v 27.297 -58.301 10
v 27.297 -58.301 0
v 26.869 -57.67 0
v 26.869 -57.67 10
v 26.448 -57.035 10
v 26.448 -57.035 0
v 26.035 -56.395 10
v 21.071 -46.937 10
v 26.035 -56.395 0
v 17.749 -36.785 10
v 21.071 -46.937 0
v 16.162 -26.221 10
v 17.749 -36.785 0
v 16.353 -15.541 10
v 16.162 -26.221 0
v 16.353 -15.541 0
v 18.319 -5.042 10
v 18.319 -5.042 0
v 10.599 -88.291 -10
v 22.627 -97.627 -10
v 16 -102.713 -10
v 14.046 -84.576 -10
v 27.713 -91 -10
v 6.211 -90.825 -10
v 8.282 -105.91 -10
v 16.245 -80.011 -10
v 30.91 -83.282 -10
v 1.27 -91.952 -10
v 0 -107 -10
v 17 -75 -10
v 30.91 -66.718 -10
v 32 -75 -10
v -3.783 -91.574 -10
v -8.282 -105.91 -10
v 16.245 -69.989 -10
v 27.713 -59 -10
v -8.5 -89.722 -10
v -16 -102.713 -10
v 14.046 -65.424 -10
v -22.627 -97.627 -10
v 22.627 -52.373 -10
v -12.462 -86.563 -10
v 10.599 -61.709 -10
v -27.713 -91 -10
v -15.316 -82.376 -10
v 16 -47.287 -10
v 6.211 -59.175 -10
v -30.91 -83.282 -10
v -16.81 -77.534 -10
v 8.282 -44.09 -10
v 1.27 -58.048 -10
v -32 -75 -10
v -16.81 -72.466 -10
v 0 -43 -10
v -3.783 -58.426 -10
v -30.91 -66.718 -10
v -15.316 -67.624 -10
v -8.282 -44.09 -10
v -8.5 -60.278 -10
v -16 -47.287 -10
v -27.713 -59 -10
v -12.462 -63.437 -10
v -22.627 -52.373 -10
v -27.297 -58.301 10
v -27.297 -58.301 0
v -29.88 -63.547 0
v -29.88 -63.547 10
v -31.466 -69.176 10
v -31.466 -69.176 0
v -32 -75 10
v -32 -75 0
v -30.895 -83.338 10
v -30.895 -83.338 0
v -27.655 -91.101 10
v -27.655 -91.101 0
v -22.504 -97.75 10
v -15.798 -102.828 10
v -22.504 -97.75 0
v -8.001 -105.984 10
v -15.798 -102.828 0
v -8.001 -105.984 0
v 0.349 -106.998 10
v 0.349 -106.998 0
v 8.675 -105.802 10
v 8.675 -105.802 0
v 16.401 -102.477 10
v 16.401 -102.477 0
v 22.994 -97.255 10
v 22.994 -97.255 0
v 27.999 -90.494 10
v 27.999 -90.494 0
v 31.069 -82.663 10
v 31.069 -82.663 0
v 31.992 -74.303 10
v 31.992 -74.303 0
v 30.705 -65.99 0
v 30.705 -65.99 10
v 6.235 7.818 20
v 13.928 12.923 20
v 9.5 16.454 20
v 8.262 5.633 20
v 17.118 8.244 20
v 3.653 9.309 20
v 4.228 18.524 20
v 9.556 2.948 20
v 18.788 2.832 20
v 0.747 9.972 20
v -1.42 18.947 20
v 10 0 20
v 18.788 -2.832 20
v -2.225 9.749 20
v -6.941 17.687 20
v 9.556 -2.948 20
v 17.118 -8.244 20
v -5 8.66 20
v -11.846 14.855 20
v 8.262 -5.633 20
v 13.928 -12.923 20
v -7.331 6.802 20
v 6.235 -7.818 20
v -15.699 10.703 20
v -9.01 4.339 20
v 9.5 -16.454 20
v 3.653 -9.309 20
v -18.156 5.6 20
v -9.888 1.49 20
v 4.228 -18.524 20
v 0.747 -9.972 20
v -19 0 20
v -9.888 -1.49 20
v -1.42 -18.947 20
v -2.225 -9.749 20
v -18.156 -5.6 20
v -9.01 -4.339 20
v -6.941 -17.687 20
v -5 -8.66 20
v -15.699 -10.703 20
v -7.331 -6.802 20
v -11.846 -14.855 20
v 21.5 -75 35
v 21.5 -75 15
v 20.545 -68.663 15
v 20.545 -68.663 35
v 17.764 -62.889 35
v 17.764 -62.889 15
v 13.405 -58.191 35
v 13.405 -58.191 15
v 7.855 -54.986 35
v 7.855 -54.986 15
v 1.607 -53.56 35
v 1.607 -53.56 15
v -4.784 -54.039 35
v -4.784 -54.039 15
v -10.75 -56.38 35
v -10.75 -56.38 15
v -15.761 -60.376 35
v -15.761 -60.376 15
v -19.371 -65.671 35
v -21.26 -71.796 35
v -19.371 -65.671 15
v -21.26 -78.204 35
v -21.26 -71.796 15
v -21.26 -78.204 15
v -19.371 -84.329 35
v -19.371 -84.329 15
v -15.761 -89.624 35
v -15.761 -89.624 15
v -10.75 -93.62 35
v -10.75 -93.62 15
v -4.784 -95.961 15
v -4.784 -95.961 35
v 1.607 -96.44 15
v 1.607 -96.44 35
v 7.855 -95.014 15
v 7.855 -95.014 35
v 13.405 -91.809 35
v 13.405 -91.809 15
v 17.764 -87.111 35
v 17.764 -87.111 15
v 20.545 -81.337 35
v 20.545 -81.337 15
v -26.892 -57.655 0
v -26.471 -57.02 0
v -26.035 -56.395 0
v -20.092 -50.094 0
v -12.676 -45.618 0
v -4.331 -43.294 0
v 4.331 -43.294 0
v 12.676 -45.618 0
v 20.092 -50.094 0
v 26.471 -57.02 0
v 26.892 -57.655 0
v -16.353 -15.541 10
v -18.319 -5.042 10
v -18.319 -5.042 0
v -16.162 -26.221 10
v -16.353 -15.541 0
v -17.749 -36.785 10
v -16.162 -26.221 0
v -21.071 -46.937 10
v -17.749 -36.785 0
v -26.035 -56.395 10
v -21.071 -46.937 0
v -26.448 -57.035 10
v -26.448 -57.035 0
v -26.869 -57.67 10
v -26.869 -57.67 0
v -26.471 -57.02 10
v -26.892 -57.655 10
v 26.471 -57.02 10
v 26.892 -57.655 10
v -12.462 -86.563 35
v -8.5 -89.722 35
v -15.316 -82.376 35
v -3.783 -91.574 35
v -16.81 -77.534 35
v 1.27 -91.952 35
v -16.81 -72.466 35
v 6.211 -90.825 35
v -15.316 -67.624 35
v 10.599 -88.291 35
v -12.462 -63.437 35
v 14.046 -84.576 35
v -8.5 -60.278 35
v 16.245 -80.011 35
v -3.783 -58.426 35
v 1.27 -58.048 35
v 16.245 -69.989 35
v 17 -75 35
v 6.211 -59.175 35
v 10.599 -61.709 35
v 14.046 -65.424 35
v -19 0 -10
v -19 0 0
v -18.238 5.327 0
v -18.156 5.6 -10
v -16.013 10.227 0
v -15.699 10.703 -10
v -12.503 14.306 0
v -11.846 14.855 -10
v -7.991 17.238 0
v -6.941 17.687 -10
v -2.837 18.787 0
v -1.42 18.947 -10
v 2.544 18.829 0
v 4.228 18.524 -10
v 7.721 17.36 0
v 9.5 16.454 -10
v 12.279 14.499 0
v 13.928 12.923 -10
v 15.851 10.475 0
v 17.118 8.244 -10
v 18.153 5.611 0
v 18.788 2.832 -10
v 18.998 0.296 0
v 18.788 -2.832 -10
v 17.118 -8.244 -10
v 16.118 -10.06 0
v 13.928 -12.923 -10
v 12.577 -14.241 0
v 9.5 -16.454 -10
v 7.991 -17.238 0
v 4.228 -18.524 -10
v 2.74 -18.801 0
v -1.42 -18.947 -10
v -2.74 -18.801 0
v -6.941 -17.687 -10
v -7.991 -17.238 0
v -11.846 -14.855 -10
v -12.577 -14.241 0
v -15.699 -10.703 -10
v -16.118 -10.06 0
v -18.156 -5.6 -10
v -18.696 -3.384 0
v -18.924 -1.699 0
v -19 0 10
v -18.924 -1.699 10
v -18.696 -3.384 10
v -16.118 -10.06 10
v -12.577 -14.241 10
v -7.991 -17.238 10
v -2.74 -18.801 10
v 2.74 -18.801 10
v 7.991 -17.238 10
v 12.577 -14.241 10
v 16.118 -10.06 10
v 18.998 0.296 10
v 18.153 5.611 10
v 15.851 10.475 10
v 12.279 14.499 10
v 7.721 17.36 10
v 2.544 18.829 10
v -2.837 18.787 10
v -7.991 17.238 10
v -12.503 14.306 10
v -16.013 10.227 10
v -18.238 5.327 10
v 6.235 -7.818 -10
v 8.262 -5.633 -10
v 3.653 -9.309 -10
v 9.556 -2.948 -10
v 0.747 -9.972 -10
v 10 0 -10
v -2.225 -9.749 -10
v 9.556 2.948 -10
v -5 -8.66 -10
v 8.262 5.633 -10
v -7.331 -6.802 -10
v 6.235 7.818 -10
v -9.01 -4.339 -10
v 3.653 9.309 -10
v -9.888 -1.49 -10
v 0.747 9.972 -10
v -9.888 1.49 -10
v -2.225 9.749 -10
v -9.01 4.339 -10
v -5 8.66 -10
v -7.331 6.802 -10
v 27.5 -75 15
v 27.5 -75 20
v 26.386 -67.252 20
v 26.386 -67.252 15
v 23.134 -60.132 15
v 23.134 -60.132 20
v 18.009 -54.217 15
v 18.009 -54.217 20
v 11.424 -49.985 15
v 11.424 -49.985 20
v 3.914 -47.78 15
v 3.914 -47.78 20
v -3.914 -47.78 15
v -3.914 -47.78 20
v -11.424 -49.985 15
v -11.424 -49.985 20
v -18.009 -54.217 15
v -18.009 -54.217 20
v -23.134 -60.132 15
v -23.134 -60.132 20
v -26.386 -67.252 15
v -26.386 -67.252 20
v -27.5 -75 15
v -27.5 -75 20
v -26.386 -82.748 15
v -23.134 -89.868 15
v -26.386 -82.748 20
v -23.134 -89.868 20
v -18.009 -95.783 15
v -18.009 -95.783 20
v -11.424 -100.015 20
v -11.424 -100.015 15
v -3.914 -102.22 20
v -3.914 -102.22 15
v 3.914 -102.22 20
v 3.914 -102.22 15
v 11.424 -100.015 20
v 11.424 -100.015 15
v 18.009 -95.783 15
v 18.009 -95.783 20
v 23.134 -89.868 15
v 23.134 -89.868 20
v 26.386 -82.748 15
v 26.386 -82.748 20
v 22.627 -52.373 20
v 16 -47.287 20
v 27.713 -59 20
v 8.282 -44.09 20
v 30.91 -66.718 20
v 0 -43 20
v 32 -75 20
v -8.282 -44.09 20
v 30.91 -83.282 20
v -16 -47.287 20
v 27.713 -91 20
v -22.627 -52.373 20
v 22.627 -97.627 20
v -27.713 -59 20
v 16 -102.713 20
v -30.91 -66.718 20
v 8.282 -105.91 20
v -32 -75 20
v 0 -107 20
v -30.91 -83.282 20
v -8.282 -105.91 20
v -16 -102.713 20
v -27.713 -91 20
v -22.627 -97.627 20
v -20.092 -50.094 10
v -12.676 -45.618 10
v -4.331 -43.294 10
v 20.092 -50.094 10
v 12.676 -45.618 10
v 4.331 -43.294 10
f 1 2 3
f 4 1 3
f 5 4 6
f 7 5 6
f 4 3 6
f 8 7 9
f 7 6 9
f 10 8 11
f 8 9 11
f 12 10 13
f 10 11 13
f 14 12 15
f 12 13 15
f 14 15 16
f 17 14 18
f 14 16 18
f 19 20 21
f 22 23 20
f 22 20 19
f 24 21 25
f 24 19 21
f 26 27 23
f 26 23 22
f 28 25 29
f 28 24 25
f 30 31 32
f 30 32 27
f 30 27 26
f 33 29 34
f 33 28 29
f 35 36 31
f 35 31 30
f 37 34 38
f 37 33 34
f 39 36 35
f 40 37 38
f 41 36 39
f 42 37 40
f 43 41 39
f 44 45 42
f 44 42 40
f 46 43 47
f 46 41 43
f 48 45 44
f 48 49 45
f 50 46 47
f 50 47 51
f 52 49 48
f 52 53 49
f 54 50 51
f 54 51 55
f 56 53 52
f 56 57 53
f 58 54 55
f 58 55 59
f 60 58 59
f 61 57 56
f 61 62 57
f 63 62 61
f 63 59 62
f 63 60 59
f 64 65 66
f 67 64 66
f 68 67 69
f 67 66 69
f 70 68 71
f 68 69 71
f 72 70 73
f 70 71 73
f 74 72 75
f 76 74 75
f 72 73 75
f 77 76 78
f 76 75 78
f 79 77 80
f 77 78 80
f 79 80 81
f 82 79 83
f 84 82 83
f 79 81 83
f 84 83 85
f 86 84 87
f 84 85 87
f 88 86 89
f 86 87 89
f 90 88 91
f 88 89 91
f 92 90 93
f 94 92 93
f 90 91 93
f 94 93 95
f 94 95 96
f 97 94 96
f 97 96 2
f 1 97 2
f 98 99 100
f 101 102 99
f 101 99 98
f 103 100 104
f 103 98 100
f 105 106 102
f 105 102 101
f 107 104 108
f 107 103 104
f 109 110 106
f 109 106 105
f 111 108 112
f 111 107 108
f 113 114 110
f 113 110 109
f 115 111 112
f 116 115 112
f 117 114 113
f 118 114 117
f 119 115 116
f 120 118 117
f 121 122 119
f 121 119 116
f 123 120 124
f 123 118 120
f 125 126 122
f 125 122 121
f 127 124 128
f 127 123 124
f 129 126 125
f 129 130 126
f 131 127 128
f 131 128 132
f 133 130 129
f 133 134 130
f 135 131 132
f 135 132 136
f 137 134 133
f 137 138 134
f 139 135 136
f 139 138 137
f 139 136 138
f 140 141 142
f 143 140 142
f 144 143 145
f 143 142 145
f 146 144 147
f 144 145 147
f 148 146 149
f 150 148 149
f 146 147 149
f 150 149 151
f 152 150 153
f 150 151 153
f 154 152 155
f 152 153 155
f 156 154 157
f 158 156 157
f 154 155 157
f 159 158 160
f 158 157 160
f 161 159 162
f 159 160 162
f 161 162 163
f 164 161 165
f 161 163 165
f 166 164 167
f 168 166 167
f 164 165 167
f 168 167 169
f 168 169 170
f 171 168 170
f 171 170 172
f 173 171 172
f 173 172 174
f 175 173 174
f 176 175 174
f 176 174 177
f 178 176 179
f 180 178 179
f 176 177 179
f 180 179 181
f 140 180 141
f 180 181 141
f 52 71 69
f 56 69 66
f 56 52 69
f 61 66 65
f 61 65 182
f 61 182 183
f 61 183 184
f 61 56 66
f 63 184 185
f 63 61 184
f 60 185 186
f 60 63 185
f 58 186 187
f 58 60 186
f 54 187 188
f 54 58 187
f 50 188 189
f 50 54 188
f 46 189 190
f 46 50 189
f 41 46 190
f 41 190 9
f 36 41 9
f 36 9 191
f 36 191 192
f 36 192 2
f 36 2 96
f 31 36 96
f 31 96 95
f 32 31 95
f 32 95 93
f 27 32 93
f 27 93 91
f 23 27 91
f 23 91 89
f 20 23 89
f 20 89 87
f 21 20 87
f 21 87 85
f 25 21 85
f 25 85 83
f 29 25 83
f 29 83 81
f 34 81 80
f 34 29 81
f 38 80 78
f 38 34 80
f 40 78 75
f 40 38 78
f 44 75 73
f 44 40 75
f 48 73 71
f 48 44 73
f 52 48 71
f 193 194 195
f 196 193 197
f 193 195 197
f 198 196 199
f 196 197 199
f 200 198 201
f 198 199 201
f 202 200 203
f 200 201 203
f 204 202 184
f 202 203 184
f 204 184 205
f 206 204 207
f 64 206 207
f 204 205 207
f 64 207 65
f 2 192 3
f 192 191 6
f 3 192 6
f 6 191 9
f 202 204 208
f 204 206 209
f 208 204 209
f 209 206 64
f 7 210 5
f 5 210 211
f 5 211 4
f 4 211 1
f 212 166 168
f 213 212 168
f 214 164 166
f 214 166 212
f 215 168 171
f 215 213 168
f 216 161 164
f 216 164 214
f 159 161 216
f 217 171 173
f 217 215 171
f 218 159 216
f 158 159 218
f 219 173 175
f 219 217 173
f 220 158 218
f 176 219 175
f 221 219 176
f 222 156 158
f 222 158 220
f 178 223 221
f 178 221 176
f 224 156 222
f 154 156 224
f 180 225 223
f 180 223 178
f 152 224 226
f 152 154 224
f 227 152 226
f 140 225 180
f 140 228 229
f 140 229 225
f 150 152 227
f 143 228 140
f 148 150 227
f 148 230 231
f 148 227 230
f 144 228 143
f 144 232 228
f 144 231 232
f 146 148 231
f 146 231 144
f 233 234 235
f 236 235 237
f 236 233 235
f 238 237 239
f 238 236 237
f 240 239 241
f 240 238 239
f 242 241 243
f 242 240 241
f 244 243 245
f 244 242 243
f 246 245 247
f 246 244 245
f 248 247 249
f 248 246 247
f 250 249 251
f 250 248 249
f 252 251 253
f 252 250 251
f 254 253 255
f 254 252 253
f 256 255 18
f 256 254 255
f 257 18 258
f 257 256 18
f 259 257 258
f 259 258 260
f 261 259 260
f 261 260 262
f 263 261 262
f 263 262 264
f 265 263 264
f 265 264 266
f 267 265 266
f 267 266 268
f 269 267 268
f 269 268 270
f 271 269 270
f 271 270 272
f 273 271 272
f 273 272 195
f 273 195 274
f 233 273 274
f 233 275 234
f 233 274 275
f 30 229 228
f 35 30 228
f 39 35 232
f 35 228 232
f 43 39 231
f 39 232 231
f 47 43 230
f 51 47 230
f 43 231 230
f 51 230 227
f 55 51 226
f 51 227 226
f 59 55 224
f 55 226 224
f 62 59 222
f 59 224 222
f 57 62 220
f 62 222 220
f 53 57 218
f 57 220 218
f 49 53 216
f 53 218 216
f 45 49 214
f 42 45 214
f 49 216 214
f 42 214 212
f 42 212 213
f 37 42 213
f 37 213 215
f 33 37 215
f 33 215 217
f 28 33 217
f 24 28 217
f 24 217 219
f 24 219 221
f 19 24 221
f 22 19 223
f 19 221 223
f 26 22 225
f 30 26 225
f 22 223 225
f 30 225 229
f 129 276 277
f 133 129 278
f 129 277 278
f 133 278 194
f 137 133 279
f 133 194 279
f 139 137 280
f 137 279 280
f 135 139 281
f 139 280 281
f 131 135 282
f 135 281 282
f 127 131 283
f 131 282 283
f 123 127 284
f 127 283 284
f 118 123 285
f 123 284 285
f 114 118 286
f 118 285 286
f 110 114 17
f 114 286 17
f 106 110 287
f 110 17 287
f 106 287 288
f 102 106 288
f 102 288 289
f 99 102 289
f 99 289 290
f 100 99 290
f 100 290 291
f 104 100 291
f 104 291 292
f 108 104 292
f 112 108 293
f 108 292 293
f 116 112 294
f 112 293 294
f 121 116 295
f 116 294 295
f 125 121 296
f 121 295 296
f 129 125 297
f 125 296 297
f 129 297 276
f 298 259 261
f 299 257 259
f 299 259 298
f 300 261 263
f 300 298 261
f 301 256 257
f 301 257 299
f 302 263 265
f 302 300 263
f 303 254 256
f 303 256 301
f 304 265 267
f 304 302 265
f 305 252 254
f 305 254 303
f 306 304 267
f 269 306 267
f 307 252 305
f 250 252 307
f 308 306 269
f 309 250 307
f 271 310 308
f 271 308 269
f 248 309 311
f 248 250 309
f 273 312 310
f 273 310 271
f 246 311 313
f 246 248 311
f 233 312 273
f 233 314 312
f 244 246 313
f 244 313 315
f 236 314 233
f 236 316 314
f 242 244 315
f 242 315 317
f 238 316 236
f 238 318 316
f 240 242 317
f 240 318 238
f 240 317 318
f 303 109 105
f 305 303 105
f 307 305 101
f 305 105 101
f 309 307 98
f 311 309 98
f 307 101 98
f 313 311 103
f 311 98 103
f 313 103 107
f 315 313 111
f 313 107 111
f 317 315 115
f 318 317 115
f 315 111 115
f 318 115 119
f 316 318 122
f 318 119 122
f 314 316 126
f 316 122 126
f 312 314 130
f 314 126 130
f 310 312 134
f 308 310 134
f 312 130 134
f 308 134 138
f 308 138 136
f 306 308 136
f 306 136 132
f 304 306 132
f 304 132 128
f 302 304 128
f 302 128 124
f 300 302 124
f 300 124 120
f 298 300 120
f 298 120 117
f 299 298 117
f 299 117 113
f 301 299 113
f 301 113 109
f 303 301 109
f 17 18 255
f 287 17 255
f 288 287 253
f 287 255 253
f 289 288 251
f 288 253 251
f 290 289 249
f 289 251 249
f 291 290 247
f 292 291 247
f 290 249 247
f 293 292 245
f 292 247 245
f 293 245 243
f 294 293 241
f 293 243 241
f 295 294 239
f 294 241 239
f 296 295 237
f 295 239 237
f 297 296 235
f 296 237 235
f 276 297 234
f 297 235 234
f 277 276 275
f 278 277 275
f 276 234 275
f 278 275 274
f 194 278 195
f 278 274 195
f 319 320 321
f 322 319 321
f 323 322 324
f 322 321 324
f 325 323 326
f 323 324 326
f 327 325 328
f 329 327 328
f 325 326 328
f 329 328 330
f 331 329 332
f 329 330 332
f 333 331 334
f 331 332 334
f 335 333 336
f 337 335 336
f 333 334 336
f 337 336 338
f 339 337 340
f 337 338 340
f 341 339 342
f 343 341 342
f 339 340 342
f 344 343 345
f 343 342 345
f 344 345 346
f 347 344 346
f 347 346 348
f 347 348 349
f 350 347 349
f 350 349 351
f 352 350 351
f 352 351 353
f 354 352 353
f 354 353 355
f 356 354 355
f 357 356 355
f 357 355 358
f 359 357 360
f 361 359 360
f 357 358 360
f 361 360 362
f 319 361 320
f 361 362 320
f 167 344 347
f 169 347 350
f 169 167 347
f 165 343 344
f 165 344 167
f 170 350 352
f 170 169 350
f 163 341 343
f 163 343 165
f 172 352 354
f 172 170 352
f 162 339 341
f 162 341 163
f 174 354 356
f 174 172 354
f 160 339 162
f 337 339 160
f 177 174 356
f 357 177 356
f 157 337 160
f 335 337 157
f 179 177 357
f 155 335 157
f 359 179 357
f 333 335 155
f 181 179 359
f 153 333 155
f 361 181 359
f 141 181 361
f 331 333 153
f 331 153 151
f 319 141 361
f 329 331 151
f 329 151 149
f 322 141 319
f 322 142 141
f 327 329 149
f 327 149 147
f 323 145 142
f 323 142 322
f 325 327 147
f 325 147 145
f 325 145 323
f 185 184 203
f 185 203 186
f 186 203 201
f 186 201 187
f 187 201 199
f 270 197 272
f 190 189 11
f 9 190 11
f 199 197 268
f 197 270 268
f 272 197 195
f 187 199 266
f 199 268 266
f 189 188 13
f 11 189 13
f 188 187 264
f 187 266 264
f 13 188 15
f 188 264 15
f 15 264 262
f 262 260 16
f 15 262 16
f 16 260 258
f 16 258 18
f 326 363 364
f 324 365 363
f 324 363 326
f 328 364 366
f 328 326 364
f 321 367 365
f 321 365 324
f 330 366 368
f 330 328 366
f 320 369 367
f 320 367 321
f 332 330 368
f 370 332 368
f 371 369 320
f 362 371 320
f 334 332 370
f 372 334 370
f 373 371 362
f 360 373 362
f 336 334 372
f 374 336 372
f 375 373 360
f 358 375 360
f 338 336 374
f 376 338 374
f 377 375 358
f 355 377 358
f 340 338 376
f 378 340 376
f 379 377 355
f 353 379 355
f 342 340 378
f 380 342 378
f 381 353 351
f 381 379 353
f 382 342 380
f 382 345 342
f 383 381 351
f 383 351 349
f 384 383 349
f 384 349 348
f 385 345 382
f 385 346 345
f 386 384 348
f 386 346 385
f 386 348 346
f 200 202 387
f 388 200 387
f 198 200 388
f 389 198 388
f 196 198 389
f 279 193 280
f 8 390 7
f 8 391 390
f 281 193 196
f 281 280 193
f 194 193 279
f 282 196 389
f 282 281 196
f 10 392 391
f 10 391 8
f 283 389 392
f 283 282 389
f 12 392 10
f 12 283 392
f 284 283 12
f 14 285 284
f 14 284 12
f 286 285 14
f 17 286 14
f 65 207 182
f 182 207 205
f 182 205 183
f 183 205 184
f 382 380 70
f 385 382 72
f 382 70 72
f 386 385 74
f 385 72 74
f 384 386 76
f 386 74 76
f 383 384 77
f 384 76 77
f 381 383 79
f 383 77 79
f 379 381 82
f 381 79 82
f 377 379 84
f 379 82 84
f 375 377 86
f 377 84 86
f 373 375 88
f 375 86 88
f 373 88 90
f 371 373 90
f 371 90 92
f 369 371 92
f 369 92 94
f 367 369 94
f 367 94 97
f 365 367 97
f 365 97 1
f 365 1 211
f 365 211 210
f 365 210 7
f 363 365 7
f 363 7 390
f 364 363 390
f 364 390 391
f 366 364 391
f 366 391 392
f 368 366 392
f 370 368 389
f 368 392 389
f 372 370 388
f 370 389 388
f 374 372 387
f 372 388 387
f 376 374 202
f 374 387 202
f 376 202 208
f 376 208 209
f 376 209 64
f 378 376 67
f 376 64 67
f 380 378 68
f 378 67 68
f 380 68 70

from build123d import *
from build123d.topology import SkipClean

# Parameters (mm, degrees)
BOSS_EXTRU_7_DEPTH       = 10
BOSS_EXTRU_13_START      = 10
ESQUISSE14_R             = 19
ESQUISSE14_R_2           = 32
BOSS_EXTRU_13_DEPTH      = 10
ESQUISSE15_R             = 19
BOSS_EXTRU_14_DEPTH      = 10
ESQUISSE16_R             = 32
BOSS_EXTRU_16_DEPTH      = 10
ESQUISSE21_R             = 27.5
ENL_V_MAT_EXTRU_10_DEPTH = 5
ESQUISSE25_R             = 21.5
BOSS_EXTRU_18_DEPTH      = 20
ESQUISSE26_R             = 17
ENL_V_MAT_EXTRU_11_DEPTH = 45
ESQUISSE27_R             = 10
ENL_V_MAT_EXTRU_12_DEPTH = 45


with BuildPart() as part:
    # Esquisse3 → Boss.-Extru.7 (new body)
    with BuildSketch(Plane.XY):
        with BuildLine():
            ThreePointArc((18.31877748, -5.042062242), (0, 19), (-18.31877748, -5.042062242))
            ThreePointArc((-18.31877748, -5.042062242), (-16.914599812, -32.664779147), (-27.297024291, -58.300525012))
            ThreePointArc((-27.297024291, -58.300525012), (0, -107), (27.297024291, -58.300525012))
            ThreePointArc((27.297024291, -58.300525012), (16.914599812, -32.664779147), (18.31877748, -5.042062242))
        make_face()
    extrude(amount=BOSS_EXTRU_7_DEPTH)

    # Esquisse14 → Boss.-Extru.13 (add)
    with SkipClean():  # the faces are left unmerged after this step: merging them gives an invalid solid
        with BuildSketch(Plane(origin=(0, 0, 0), x_dir=(-1, 0, 0), z_dir=(0, 0, -1)).offset(BOSS_EXTRU_13_START)):
            Circle(ESQUISSE14_R)
            with Locations((0, -75)):
                Circle(ESQUISSE14_R_2)
        extrude(amount=-BOSS_EXTRU_13_DEPTH)

    # Esquisse15 → Boss.-Extru.14 (add)
    with SkipClean():  # the faces are left unmerged after this step: merging them gives an invalid solid
        with BuildSketch(Plane.XY.offset(10)):
            with Locations(Location((0, 0, 0), (0, 0, 180))):
                Circle(ESQUISSE15_R)
        extrude(amount=BOSS_EXTRU_14_DEPTH)

    # Esquisse16 → Boss.-Extru.16 (add)
    with SkipClean():  # the faces are left unmerged after this step: merging them gives an invalid solid
        with BuildSketch(Plane.XY.offset(10)):
            with Locations(Location((0, -75, 0), (0, 0, 180))):
                Circle(ESQUISSE16_R)
        extrude(amount=BOSS_EXTRU_16_DEPTH)

    # Esquisse21 → Enlèv. mat.-Extru.10 (cut)
    with SkipClean():  # the faces are left unmerged after this step: merging them gives an invalid solid
        with BuildSketch(Plane.XY.offset(20)):
            with Locations((0, -75)):
                Circle(ESQUISSE21_R)
        extrude(amount=-ENL_V_MAT_EXTRU_10_DEPTH, mode=Mode.SUBTRACT)

    # Esquisse25 → Boss.-Extru.18 (add)
    with SkipClean():  # the faces are left unmerged after this step: merging them gives an invalid solid
        with BuildSketch(Plane.XY.offset(15)):
            with Locations((0, -75)):
                Circle(ESQUISSE25_R)
        extrude(amount=BOSS_EXTRU_18_DEPTH)

    # Esquisse26 → Enlèv. mat.-Extru.11 (cut)
    with SkipClean():  # the faces are left unmerged after this step: merging them gives an invalid solid
        with BuildSketch(Plane.XY.offset(35)):
            with Locations((0, -75)):
                Circle(ESQUISSE26_R)
        extrude(amount=-ENL_V_MAT_EXTRU_11_DEPTH, mode=Mode.SUBTRACT)

    # Esquisse27 → Enlèv. mat.-Extru.12 (cut)
    with SkipClean():  # the faces are left unmerged after this step: merging them gives an invalid solid
        with BuildSketch(Plane.XY.offset(20)):
            Circle(ESQUISSE27_R)
        extrude(amount=-ENL_V_MAT_EXTRU_12_DEPTH, mode=Mode.SUBTRACT)


solid = part.part
